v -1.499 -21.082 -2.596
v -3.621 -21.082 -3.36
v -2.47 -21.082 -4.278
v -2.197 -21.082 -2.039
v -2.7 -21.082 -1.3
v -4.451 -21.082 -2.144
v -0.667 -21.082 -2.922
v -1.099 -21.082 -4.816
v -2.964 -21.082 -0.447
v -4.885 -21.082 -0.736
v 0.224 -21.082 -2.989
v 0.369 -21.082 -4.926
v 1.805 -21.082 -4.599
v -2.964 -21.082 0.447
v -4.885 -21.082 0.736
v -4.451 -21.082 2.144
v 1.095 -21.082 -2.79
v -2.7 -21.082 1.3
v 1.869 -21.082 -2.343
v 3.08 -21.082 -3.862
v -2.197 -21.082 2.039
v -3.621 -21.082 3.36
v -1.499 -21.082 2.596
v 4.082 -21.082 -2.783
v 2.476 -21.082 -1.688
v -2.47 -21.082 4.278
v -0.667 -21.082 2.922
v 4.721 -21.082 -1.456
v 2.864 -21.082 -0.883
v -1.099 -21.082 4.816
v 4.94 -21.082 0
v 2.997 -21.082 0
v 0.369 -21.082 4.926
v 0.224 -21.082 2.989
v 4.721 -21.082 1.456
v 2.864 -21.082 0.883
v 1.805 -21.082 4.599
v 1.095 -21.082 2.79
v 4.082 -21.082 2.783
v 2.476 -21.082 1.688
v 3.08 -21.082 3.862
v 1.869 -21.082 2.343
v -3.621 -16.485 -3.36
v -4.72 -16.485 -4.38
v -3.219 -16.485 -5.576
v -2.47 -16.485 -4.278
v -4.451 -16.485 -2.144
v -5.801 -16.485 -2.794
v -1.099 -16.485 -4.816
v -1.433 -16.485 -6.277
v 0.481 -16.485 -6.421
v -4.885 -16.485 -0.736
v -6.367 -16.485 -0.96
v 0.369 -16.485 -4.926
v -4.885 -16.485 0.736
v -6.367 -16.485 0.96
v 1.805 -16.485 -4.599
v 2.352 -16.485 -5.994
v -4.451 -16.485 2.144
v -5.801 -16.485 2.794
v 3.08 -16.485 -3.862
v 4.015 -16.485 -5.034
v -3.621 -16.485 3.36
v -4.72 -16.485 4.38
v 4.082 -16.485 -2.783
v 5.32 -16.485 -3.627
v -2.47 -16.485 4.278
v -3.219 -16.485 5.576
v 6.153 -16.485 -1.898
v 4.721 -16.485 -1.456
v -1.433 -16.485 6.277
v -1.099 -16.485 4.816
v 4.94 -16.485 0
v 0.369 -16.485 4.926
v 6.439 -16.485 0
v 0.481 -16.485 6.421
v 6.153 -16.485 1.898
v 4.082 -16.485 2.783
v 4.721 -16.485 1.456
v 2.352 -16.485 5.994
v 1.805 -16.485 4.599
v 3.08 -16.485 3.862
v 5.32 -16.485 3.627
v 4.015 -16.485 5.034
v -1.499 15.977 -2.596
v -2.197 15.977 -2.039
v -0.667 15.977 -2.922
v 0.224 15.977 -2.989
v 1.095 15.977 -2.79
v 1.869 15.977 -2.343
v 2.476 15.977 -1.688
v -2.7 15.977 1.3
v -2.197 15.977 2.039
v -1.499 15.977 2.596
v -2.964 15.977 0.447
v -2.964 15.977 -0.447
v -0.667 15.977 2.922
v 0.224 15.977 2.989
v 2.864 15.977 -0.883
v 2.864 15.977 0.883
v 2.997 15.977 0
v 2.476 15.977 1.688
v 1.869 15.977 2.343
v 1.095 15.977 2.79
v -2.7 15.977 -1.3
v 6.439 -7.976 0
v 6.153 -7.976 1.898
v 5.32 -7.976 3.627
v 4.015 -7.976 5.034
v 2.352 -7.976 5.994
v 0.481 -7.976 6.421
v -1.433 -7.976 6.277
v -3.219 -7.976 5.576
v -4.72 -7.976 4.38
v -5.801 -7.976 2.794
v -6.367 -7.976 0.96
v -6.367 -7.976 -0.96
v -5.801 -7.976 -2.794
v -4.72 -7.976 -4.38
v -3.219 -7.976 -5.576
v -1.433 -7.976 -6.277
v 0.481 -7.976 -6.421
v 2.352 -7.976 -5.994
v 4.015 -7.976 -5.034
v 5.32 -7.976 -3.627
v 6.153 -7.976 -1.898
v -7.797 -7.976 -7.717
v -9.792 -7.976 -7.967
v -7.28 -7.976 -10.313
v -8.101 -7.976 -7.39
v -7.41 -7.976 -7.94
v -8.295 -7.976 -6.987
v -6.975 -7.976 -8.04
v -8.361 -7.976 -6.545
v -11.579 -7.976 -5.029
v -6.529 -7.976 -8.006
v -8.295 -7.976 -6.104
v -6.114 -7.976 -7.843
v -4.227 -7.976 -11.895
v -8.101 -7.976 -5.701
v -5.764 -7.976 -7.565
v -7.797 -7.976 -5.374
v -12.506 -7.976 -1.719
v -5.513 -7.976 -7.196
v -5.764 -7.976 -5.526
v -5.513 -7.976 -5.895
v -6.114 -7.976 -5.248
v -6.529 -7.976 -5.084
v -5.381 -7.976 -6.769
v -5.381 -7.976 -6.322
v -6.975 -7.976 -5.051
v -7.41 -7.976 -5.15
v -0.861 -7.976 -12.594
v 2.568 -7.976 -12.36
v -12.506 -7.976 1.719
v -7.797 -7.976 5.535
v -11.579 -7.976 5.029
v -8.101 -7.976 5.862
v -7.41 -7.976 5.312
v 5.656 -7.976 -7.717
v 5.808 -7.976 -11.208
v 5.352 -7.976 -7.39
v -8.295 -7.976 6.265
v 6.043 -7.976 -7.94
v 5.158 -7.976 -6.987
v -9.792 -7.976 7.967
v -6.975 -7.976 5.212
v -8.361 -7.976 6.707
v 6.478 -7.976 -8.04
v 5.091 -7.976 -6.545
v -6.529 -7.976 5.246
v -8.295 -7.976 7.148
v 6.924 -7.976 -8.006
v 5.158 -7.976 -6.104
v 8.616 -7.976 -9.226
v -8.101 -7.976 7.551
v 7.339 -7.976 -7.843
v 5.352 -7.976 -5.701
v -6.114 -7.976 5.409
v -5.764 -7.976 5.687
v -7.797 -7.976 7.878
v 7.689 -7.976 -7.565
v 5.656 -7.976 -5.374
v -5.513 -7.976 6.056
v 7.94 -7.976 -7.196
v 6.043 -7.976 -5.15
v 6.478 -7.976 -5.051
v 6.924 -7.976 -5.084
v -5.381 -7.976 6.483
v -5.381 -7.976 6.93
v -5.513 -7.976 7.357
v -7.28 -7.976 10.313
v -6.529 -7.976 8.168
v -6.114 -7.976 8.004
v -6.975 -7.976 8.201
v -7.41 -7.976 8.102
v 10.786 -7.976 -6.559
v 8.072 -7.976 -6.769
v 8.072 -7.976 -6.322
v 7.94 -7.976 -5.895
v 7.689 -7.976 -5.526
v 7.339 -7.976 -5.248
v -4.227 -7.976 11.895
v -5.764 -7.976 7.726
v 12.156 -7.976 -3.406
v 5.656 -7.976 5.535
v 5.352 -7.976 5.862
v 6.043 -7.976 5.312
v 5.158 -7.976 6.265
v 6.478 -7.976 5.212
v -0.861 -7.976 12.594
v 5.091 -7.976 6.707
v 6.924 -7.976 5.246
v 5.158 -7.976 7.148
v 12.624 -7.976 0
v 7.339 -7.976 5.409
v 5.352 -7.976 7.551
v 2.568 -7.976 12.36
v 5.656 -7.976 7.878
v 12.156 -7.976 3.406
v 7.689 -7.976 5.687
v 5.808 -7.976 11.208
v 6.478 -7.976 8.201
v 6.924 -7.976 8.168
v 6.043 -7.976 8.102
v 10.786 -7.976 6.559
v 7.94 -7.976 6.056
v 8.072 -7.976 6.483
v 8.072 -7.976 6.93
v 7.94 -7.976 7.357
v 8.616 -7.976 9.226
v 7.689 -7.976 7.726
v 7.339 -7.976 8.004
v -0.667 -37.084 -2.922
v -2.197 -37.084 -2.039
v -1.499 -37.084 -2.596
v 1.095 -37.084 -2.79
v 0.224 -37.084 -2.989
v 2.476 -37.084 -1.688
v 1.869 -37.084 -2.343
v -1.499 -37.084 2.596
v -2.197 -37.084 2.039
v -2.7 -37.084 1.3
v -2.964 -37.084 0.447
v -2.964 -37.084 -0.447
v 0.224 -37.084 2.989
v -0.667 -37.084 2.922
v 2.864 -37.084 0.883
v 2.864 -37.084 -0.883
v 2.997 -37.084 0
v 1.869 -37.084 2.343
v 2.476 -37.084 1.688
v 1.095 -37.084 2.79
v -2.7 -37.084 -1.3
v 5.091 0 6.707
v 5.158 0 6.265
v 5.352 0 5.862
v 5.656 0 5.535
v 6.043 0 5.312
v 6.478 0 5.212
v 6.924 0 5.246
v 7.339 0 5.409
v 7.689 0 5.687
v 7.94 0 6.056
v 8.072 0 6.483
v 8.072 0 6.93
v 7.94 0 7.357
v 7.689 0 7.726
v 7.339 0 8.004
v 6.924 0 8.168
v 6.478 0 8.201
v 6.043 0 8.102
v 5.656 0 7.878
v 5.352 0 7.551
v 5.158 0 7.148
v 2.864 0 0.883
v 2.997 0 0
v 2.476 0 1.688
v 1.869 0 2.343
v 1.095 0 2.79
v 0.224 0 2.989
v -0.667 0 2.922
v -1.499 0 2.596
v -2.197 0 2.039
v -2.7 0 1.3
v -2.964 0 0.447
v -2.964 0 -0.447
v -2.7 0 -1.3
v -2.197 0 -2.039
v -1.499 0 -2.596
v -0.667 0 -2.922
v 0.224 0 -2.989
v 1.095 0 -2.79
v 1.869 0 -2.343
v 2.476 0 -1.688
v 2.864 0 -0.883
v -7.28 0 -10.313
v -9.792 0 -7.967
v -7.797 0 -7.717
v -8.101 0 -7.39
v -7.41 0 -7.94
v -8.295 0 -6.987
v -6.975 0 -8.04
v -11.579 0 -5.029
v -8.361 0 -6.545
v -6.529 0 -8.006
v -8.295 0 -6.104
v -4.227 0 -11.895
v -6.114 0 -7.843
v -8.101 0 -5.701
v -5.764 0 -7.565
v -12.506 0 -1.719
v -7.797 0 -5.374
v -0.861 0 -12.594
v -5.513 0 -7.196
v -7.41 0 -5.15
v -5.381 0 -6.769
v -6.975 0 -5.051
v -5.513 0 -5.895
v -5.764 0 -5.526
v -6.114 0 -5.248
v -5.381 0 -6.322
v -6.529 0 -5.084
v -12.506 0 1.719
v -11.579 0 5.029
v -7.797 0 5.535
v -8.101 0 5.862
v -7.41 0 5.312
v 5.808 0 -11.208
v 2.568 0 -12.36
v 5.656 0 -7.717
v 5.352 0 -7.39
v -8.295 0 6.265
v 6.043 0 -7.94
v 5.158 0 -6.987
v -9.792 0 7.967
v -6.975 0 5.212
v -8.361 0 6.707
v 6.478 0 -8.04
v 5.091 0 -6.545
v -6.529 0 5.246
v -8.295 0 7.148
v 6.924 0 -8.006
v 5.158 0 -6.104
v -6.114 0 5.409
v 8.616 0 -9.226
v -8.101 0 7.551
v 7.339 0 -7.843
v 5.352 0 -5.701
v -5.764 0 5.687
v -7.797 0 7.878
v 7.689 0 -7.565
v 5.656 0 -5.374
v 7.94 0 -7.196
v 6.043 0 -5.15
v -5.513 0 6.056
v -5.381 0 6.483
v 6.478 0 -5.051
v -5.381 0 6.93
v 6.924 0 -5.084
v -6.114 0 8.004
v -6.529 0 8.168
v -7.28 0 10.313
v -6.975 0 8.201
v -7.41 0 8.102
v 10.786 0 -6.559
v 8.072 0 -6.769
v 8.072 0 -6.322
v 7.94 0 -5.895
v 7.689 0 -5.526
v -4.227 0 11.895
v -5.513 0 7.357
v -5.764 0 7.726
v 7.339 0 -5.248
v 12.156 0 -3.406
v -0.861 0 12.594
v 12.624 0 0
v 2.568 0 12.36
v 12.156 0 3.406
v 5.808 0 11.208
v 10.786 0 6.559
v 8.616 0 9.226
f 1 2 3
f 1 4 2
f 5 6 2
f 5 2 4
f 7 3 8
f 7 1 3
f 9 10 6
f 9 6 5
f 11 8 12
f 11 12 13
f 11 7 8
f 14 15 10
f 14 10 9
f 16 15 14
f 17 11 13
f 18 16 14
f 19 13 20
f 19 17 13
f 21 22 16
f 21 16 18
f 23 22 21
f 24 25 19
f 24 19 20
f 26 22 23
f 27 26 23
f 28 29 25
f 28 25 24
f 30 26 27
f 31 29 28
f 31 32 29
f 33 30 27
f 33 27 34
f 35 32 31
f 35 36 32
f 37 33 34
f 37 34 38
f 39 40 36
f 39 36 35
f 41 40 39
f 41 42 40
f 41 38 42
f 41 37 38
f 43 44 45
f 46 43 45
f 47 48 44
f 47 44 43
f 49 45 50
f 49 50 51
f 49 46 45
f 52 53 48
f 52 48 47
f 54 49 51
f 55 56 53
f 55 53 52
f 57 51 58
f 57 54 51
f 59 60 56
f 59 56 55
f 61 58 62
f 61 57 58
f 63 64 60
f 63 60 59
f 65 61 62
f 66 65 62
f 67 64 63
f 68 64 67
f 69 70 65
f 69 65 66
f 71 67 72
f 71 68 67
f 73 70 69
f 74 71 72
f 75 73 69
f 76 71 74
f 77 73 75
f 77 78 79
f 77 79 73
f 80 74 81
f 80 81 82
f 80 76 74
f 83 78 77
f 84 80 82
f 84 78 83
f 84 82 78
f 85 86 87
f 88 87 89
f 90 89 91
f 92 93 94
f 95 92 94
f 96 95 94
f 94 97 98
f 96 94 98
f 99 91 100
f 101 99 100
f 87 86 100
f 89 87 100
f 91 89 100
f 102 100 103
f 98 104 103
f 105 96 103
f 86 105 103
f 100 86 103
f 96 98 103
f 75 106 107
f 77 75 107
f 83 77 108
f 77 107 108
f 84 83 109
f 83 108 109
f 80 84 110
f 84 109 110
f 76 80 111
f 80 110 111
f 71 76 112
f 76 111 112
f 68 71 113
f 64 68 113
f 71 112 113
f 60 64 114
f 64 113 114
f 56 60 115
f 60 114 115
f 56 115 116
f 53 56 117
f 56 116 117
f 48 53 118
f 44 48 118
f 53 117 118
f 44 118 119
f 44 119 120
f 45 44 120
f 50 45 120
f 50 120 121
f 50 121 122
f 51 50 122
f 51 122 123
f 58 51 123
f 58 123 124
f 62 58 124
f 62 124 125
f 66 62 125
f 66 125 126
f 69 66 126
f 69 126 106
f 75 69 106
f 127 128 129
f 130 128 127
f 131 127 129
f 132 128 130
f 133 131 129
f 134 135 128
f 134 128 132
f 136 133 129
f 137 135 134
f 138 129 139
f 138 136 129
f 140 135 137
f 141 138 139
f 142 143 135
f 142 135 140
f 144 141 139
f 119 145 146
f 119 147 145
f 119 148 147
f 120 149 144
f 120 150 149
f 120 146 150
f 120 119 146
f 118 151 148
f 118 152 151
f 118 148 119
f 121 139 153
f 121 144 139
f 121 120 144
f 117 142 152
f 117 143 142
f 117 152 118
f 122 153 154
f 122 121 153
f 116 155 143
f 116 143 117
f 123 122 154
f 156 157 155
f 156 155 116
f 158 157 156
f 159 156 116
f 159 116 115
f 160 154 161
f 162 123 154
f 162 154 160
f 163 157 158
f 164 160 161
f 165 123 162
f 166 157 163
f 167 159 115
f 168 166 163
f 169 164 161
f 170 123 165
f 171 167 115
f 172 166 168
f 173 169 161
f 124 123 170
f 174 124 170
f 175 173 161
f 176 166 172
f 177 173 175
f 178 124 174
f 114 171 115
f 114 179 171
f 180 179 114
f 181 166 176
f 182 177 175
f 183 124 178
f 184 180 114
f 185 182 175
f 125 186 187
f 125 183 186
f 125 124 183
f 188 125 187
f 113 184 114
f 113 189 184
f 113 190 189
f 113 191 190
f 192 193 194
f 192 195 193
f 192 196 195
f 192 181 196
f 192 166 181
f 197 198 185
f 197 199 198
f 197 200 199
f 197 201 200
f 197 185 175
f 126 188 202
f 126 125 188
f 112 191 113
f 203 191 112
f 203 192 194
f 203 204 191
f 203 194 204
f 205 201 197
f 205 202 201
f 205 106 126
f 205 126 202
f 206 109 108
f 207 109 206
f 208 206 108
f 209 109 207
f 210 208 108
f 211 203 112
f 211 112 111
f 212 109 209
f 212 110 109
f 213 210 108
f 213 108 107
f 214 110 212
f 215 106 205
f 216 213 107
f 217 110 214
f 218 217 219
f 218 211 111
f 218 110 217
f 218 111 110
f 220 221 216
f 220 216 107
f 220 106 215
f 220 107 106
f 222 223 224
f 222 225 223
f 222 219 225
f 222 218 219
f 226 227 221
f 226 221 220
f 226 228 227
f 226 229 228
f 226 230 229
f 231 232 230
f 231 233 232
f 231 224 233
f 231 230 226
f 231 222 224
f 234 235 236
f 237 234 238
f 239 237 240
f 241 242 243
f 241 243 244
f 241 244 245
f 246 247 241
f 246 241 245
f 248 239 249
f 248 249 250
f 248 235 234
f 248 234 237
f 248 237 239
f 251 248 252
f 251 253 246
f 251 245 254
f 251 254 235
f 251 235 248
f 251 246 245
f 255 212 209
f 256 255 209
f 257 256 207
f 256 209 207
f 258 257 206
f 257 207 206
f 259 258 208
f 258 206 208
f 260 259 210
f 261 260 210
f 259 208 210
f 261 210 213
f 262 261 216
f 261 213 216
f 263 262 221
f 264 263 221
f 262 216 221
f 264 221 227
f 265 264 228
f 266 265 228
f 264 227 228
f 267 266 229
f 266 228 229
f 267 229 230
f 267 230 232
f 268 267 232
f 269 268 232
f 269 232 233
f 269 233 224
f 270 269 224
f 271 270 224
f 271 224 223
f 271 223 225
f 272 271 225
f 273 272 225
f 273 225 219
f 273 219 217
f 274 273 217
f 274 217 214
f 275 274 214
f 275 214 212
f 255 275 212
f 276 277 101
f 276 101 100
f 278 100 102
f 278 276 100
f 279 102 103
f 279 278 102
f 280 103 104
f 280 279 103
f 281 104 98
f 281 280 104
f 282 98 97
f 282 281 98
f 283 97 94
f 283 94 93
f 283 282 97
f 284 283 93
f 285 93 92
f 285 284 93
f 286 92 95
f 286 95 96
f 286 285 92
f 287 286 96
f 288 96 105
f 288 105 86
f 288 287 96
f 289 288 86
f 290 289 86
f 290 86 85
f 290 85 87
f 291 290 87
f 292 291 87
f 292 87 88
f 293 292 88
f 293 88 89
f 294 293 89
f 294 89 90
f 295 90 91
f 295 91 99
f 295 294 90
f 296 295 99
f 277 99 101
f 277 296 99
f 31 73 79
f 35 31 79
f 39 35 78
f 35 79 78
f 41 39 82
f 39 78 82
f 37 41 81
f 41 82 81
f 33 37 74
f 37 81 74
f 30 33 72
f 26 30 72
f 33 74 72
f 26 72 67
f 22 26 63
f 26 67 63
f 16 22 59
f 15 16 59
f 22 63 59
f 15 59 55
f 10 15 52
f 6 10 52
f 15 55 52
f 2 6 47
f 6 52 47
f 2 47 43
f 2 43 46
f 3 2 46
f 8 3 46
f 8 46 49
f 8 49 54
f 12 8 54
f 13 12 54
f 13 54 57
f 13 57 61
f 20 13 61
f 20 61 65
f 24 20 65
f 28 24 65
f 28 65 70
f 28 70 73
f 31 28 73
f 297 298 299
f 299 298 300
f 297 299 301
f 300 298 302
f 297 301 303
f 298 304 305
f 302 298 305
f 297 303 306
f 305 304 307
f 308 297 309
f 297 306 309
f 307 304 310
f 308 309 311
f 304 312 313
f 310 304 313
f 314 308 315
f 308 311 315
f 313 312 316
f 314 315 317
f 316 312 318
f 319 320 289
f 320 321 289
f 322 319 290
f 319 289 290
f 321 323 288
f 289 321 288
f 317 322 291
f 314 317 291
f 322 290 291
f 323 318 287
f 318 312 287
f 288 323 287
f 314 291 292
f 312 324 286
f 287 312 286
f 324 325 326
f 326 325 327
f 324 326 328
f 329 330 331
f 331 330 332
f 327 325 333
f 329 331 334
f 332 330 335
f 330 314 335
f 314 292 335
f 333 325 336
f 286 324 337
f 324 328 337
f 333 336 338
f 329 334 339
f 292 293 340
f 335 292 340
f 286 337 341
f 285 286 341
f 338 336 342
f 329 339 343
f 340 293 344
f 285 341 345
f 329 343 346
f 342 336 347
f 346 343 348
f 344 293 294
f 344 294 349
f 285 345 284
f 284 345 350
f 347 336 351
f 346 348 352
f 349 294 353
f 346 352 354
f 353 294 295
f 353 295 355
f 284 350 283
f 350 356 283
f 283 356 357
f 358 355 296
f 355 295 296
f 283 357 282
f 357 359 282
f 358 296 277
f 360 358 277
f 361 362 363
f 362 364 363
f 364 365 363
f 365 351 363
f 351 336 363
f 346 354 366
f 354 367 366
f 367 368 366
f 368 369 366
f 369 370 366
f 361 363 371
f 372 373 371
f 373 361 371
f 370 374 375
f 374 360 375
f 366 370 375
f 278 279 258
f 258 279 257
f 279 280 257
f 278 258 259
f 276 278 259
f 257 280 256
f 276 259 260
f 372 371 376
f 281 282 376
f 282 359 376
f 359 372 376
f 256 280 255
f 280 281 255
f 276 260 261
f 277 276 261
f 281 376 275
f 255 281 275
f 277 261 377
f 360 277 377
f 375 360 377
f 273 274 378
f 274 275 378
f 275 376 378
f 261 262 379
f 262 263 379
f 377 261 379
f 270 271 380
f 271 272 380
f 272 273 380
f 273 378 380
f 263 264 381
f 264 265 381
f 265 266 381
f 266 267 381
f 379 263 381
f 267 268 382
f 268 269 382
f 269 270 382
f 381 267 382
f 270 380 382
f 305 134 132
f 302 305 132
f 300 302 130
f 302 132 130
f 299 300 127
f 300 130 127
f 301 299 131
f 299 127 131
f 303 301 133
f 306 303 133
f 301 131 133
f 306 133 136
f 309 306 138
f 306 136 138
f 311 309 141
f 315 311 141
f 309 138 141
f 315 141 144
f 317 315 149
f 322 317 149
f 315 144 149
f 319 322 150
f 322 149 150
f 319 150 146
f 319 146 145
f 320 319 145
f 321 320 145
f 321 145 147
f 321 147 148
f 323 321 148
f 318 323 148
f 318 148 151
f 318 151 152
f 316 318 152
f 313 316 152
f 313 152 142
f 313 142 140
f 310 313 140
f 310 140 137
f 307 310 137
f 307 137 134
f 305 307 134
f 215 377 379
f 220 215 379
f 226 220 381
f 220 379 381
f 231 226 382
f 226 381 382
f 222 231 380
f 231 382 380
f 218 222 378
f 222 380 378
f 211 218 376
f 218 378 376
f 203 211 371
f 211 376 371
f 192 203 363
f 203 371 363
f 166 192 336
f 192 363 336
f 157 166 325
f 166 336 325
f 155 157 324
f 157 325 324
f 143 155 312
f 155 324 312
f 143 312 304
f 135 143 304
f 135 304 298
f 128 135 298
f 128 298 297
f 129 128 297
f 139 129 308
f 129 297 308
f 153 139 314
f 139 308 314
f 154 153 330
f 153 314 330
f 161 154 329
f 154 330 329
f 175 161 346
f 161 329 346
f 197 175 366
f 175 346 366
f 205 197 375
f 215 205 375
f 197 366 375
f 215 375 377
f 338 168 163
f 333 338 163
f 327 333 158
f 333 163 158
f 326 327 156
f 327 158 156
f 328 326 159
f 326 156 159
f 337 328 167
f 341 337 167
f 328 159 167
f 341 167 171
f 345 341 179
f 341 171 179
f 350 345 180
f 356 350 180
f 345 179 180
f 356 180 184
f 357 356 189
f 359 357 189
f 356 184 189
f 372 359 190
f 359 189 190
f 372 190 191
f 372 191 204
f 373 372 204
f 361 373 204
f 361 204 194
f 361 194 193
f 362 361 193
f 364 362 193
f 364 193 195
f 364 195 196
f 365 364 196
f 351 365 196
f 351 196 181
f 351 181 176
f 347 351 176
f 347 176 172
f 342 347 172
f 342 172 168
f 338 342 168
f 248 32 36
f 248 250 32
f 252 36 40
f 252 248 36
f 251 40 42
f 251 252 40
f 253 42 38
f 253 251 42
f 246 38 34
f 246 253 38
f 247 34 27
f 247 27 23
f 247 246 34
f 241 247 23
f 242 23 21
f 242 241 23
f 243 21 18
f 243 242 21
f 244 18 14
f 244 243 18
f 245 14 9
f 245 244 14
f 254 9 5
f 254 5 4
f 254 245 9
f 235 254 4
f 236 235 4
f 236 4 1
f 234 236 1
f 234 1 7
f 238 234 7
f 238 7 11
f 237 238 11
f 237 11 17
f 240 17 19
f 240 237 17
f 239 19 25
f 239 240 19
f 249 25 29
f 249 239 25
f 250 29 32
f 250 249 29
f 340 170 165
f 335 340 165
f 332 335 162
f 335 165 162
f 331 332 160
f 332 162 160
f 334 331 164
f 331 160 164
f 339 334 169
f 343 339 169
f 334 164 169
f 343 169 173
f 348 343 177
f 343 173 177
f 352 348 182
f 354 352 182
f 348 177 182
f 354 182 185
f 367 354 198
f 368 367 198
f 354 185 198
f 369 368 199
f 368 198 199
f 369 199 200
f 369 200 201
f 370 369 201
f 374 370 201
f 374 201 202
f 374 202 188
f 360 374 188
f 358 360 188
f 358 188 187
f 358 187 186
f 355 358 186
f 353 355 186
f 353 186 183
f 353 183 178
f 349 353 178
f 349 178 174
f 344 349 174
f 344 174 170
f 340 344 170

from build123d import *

# Parameters (mm, degrees)
F0_R          = 2.9972
F5_DEPTH      = 37.084
F5_DEPTH_BACK = 15.9766
F1_R          = 4.9403
F6_DEPTH      = 21.082
F2_R          = 6.4389
F7_DEPTH      = 16.4846
F3_R          = 12.6238
F8_DEPTH      = 7.9756
F9_D          = 2.9972


with BuildPart() as f5:
    # F0 (on Front) → F5 (new body, two sides)
    with BuildSketch(Plane.XZ) as f5_sk:
        Circle(F0_R)
    extrude(amount=F5_DEPTH)
    extrude(f5_sk.sketch, amount=-F5_DEPTH_BACK)

    # F1 (on Front) → F6 (join)
    with BuildSketch(Plane.XZ):
        Circle(F1_R)
    extrude(amount=F6_DEPTH)

    # F2 (on Front) → F7 (join)
    with BuildSketch(Plane.XZ):
        Circle(F2_R)
    extrude(amount=F7_DEPTH)

    # F3 (on Front) → F8 (join)
    with BuildSketch(Plane.XZ):
        Circle(F3_R)
    extrude(amount=F8_DEPTH)

    # F9 (through all)
    with Locations(Plane(origin=(0, 0, 0), x_dir=(1, 0, 0), z_dir=(0, 1, 0))):
        with Locations((-6.8628041832, -6.7065595315), (6.5900925825, -6.7065595315), (6.5900925825, 6.5454167448), (-6.8628041832, 6.5454167448)):
            Hole(F9_D / 2)


solid = f5.part
